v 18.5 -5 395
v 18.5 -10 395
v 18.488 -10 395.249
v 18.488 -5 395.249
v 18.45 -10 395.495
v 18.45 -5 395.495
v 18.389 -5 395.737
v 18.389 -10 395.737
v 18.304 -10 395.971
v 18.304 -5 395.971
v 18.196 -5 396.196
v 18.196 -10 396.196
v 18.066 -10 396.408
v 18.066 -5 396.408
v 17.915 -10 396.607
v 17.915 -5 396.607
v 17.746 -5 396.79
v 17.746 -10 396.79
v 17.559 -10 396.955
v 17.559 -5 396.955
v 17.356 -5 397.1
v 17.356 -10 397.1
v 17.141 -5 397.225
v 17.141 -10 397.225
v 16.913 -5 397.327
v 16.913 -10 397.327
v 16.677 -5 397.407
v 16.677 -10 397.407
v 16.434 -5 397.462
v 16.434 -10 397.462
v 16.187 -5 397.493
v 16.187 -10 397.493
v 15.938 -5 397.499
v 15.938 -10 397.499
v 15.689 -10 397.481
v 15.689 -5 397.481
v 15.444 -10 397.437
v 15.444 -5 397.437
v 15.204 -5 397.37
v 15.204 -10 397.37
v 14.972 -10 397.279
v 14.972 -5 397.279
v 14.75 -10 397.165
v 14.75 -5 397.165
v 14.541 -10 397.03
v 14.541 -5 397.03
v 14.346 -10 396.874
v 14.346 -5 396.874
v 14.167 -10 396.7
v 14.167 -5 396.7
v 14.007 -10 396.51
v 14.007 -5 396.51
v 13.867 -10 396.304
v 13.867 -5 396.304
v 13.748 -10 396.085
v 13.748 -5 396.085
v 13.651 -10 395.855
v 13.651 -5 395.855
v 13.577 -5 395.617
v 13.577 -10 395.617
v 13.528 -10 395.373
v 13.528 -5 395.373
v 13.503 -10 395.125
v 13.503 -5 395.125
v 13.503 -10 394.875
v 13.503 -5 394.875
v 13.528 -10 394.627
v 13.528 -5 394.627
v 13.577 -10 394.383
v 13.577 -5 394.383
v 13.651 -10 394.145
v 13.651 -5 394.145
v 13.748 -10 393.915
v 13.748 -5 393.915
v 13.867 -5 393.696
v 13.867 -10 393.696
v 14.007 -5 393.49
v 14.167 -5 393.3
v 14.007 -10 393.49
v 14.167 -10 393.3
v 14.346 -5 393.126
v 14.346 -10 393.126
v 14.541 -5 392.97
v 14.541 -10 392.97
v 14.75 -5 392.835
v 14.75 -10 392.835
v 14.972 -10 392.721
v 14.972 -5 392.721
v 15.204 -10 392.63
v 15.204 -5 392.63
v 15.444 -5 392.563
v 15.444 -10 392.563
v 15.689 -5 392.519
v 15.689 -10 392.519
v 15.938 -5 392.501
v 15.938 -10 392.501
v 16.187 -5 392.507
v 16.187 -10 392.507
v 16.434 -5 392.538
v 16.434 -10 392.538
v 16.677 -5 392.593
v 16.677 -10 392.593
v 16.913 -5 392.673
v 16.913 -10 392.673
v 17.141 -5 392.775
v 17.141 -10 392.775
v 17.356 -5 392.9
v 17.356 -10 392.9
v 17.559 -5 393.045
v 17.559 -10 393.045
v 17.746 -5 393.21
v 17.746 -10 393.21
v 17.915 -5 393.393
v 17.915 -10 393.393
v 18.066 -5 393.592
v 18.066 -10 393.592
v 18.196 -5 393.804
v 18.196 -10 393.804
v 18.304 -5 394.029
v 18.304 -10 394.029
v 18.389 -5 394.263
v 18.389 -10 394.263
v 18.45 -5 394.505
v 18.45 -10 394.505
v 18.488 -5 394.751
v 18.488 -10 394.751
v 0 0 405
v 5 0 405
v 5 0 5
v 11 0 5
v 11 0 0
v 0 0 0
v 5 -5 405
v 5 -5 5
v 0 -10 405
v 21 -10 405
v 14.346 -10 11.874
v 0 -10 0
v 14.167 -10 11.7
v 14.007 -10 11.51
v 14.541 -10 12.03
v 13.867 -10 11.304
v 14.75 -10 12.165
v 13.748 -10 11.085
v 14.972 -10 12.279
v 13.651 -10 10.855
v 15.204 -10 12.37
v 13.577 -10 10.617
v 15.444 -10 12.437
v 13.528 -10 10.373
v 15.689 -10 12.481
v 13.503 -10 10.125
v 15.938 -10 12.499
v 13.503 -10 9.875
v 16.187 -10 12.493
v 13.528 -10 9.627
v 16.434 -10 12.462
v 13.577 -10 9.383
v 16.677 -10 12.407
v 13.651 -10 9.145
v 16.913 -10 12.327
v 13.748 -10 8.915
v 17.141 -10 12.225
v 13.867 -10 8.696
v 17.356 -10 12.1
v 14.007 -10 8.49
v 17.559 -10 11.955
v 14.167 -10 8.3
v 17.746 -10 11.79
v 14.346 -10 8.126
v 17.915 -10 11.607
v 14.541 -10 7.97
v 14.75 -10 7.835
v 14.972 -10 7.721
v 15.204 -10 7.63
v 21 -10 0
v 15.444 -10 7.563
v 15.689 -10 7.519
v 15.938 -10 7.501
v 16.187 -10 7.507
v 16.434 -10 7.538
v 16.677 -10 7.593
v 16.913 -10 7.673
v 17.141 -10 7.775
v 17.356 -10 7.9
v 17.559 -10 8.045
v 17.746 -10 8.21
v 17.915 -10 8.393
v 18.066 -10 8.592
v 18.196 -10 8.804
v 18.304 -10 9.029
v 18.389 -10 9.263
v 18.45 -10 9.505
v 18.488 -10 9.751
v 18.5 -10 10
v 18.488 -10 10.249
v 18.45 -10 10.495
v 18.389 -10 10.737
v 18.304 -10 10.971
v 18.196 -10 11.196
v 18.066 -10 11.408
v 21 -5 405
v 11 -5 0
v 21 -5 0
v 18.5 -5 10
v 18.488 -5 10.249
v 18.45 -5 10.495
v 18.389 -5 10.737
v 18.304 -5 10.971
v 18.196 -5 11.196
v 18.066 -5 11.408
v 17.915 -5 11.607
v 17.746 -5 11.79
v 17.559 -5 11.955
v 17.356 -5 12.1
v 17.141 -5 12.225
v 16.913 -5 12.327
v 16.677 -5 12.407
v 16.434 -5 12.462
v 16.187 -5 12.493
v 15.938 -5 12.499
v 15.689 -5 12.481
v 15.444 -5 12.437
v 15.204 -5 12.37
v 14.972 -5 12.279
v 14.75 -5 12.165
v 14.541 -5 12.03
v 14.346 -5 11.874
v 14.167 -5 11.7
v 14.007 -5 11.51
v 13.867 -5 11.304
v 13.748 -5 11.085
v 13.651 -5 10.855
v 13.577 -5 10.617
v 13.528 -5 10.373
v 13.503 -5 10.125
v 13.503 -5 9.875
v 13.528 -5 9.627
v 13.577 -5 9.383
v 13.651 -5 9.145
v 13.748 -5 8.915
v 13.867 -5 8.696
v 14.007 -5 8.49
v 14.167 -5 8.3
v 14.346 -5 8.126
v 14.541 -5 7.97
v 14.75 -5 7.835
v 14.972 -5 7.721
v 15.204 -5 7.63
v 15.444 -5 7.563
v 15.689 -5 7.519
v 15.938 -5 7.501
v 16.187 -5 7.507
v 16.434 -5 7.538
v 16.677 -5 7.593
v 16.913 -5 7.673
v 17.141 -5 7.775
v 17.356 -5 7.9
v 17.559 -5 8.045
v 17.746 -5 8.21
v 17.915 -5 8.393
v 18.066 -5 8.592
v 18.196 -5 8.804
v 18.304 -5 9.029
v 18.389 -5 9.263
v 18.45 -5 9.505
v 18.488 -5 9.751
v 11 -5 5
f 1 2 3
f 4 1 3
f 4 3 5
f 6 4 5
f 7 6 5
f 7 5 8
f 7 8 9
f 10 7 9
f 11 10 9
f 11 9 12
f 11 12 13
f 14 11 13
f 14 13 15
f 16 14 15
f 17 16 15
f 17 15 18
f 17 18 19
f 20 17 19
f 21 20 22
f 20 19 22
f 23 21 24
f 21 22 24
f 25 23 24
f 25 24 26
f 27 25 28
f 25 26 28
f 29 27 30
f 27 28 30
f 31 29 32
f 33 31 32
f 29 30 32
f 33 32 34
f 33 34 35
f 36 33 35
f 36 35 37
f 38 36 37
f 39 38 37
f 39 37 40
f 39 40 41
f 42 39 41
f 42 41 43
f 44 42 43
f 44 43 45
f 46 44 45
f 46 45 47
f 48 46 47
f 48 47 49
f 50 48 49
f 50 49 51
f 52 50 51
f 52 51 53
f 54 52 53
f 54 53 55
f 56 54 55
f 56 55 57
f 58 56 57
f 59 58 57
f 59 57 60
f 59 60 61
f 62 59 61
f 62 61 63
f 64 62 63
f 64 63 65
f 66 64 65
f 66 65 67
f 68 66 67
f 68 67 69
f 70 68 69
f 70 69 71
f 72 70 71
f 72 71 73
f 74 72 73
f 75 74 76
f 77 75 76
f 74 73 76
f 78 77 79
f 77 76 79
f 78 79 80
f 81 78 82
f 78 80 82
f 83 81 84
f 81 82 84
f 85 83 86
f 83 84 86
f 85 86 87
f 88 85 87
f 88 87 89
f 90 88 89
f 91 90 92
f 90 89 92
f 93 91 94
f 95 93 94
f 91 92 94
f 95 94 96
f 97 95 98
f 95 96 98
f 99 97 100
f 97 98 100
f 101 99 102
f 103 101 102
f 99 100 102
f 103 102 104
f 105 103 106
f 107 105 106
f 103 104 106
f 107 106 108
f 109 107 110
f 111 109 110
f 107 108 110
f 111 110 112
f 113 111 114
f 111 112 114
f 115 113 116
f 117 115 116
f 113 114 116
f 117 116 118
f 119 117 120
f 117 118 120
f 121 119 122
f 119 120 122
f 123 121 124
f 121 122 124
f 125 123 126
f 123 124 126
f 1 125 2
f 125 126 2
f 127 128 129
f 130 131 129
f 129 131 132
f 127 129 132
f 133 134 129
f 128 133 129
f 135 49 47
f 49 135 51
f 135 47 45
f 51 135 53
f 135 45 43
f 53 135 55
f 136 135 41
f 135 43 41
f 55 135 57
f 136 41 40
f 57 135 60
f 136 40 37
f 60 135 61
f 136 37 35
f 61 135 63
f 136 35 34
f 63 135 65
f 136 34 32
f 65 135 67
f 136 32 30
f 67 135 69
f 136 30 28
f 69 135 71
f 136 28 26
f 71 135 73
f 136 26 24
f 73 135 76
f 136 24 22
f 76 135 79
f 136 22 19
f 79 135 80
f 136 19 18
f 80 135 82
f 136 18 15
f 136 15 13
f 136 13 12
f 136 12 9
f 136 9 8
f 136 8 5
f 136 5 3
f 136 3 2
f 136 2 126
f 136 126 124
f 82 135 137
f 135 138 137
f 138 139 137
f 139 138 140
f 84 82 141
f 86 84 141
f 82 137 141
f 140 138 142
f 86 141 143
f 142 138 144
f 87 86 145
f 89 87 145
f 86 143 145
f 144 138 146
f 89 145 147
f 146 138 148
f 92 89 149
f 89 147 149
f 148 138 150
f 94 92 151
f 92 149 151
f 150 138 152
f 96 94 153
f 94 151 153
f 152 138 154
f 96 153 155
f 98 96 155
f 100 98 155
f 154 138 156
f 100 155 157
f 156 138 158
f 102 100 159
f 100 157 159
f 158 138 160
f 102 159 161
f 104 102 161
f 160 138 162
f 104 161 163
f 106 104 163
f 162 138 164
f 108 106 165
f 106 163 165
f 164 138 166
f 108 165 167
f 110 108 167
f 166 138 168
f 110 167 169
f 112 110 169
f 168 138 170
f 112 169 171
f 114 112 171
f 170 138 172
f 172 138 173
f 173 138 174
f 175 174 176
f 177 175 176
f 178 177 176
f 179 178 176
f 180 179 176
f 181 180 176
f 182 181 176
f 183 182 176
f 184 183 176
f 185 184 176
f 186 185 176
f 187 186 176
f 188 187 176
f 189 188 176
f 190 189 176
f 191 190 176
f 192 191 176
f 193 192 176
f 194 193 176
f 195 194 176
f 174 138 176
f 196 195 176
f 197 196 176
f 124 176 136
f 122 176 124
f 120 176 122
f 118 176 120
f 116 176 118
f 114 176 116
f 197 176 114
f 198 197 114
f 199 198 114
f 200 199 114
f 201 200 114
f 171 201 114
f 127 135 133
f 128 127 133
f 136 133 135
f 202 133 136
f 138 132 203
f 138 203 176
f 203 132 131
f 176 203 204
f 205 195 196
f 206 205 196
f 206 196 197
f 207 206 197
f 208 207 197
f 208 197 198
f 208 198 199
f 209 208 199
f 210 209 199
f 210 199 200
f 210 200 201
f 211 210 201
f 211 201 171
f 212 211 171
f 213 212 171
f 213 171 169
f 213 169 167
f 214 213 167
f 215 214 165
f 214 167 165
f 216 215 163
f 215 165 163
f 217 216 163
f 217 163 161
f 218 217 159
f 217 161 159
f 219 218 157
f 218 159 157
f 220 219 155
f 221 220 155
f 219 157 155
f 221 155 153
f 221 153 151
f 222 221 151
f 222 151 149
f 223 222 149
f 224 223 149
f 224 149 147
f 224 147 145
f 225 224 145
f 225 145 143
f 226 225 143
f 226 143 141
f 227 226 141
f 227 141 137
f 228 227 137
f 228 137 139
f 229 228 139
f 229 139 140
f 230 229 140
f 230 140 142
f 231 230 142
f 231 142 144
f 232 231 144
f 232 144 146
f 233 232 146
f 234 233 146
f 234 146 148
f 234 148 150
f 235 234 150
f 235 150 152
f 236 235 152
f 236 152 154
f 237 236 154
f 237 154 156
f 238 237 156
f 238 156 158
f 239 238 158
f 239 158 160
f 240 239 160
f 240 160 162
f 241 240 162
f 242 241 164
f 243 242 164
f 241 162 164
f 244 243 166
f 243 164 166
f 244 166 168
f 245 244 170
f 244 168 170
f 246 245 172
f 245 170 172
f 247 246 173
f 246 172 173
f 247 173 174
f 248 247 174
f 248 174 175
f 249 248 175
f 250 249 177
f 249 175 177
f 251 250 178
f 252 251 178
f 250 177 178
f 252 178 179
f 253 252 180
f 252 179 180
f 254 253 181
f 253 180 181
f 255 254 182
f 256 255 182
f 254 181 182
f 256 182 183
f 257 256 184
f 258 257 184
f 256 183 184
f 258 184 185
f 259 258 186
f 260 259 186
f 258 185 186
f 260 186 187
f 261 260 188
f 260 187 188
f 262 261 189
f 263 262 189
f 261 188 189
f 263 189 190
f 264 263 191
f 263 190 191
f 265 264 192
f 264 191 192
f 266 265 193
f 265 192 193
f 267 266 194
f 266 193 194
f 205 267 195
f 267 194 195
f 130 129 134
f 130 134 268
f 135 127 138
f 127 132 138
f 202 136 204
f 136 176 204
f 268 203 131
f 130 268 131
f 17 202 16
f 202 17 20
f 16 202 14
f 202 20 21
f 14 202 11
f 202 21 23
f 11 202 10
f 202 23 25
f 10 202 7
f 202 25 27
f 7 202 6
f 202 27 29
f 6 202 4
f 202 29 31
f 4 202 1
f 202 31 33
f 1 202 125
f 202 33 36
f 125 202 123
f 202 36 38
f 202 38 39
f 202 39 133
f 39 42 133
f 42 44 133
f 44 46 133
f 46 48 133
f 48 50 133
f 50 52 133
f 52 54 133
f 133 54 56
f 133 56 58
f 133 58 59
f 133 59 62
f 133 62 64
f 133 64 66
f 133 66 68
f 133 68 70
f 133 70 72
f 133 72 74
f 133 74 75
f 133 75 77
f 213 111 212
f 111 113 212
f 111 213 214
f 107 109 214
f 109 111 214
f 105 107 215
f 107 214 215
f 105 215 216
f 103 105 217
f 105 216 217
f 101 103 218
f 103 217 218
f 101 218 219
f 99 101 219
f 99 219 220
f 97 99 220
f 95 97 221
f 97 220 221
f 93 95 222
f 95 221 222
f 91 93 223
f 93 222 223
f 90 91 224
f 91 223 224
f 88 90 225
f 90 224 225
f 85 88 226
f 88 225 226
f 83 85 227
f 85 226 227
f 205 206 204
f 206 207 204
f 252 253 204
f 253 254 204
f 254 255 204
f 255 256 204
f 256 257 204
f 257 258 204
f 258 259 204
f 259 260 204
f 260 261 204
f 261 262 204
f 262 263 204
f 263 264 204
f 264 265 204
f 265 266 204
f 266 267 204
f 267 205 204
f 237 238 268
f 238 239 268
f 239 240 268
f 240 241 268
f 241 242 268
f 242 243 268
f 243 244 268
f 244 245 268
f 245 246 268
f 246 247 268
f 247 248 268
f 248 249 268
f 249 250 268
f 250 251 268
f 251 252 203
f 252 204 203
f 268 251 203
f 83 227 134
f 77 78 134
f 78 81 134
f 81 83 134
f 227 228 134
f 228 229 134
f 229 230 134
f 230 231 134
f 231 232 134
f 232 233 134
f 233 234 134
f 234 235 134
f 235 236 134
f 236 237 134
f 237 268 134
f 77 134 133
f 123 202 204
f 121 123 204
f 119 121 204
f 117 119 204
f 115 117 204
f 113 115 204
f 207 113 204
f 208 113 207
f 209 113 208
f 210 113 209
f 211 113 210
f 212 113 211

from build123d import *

# Parameters (mm, degrees)
F1_DEPTH = 5
F3_DEPTH = 400
F5_D     = 5
F7_D     = 5
F8_W     = 5
F8_H     = 5
F9_DEPTH = 400


with BuildPart() as f1:
    # F0 (on Top) → F1 (new body)
    with BuildSketch(Plane.XY):
        Polygon((5, 0), (0, 0), (0, -10), (21, -10), (21, -5), (11, -5), (11, 0), (6, 0), align=None)
    extrude(amount=F1_DEPTH)

    # F2 (on face) → F3 (join)
    with BuildSketch(Plane.XY.offset(5)):
        Polygon((5, 0), (0, 0), (0, -10), (21, -10), (21, -5), (11, -5), (11, 0), (6, 0), (6, -5), (5, -5), align=None)
    extrude(amount=F3_DEPTH)

    # F5 (through all)
    with Locations(Plane(origin=(0, -5, 0), x_dir=(-1, 0, 0), z_dir=(0, 1, 0))):
        with Locations((-16, 10)):
            Hole(F5_D / 2)

    # F7 (through all)
    with Locations(Plane(origin=(0, -5, 0), x_dir=(-1, 0, 0), z_dir=(0, 1, 0))):
        with Locations((-16, 395)):
            Hole(F7_D / 2)

    # F8 (on face) → F9 (cut)
    with BuildSketch(Plane.XY.offset(405)):
        with Locations((8.5, -2.5)):
            Rectangle(F8_W, F8_H)
    extrude(amount=-F9_DEPTH, mode=Mode.SUBTRACT)


solid = f1.part
